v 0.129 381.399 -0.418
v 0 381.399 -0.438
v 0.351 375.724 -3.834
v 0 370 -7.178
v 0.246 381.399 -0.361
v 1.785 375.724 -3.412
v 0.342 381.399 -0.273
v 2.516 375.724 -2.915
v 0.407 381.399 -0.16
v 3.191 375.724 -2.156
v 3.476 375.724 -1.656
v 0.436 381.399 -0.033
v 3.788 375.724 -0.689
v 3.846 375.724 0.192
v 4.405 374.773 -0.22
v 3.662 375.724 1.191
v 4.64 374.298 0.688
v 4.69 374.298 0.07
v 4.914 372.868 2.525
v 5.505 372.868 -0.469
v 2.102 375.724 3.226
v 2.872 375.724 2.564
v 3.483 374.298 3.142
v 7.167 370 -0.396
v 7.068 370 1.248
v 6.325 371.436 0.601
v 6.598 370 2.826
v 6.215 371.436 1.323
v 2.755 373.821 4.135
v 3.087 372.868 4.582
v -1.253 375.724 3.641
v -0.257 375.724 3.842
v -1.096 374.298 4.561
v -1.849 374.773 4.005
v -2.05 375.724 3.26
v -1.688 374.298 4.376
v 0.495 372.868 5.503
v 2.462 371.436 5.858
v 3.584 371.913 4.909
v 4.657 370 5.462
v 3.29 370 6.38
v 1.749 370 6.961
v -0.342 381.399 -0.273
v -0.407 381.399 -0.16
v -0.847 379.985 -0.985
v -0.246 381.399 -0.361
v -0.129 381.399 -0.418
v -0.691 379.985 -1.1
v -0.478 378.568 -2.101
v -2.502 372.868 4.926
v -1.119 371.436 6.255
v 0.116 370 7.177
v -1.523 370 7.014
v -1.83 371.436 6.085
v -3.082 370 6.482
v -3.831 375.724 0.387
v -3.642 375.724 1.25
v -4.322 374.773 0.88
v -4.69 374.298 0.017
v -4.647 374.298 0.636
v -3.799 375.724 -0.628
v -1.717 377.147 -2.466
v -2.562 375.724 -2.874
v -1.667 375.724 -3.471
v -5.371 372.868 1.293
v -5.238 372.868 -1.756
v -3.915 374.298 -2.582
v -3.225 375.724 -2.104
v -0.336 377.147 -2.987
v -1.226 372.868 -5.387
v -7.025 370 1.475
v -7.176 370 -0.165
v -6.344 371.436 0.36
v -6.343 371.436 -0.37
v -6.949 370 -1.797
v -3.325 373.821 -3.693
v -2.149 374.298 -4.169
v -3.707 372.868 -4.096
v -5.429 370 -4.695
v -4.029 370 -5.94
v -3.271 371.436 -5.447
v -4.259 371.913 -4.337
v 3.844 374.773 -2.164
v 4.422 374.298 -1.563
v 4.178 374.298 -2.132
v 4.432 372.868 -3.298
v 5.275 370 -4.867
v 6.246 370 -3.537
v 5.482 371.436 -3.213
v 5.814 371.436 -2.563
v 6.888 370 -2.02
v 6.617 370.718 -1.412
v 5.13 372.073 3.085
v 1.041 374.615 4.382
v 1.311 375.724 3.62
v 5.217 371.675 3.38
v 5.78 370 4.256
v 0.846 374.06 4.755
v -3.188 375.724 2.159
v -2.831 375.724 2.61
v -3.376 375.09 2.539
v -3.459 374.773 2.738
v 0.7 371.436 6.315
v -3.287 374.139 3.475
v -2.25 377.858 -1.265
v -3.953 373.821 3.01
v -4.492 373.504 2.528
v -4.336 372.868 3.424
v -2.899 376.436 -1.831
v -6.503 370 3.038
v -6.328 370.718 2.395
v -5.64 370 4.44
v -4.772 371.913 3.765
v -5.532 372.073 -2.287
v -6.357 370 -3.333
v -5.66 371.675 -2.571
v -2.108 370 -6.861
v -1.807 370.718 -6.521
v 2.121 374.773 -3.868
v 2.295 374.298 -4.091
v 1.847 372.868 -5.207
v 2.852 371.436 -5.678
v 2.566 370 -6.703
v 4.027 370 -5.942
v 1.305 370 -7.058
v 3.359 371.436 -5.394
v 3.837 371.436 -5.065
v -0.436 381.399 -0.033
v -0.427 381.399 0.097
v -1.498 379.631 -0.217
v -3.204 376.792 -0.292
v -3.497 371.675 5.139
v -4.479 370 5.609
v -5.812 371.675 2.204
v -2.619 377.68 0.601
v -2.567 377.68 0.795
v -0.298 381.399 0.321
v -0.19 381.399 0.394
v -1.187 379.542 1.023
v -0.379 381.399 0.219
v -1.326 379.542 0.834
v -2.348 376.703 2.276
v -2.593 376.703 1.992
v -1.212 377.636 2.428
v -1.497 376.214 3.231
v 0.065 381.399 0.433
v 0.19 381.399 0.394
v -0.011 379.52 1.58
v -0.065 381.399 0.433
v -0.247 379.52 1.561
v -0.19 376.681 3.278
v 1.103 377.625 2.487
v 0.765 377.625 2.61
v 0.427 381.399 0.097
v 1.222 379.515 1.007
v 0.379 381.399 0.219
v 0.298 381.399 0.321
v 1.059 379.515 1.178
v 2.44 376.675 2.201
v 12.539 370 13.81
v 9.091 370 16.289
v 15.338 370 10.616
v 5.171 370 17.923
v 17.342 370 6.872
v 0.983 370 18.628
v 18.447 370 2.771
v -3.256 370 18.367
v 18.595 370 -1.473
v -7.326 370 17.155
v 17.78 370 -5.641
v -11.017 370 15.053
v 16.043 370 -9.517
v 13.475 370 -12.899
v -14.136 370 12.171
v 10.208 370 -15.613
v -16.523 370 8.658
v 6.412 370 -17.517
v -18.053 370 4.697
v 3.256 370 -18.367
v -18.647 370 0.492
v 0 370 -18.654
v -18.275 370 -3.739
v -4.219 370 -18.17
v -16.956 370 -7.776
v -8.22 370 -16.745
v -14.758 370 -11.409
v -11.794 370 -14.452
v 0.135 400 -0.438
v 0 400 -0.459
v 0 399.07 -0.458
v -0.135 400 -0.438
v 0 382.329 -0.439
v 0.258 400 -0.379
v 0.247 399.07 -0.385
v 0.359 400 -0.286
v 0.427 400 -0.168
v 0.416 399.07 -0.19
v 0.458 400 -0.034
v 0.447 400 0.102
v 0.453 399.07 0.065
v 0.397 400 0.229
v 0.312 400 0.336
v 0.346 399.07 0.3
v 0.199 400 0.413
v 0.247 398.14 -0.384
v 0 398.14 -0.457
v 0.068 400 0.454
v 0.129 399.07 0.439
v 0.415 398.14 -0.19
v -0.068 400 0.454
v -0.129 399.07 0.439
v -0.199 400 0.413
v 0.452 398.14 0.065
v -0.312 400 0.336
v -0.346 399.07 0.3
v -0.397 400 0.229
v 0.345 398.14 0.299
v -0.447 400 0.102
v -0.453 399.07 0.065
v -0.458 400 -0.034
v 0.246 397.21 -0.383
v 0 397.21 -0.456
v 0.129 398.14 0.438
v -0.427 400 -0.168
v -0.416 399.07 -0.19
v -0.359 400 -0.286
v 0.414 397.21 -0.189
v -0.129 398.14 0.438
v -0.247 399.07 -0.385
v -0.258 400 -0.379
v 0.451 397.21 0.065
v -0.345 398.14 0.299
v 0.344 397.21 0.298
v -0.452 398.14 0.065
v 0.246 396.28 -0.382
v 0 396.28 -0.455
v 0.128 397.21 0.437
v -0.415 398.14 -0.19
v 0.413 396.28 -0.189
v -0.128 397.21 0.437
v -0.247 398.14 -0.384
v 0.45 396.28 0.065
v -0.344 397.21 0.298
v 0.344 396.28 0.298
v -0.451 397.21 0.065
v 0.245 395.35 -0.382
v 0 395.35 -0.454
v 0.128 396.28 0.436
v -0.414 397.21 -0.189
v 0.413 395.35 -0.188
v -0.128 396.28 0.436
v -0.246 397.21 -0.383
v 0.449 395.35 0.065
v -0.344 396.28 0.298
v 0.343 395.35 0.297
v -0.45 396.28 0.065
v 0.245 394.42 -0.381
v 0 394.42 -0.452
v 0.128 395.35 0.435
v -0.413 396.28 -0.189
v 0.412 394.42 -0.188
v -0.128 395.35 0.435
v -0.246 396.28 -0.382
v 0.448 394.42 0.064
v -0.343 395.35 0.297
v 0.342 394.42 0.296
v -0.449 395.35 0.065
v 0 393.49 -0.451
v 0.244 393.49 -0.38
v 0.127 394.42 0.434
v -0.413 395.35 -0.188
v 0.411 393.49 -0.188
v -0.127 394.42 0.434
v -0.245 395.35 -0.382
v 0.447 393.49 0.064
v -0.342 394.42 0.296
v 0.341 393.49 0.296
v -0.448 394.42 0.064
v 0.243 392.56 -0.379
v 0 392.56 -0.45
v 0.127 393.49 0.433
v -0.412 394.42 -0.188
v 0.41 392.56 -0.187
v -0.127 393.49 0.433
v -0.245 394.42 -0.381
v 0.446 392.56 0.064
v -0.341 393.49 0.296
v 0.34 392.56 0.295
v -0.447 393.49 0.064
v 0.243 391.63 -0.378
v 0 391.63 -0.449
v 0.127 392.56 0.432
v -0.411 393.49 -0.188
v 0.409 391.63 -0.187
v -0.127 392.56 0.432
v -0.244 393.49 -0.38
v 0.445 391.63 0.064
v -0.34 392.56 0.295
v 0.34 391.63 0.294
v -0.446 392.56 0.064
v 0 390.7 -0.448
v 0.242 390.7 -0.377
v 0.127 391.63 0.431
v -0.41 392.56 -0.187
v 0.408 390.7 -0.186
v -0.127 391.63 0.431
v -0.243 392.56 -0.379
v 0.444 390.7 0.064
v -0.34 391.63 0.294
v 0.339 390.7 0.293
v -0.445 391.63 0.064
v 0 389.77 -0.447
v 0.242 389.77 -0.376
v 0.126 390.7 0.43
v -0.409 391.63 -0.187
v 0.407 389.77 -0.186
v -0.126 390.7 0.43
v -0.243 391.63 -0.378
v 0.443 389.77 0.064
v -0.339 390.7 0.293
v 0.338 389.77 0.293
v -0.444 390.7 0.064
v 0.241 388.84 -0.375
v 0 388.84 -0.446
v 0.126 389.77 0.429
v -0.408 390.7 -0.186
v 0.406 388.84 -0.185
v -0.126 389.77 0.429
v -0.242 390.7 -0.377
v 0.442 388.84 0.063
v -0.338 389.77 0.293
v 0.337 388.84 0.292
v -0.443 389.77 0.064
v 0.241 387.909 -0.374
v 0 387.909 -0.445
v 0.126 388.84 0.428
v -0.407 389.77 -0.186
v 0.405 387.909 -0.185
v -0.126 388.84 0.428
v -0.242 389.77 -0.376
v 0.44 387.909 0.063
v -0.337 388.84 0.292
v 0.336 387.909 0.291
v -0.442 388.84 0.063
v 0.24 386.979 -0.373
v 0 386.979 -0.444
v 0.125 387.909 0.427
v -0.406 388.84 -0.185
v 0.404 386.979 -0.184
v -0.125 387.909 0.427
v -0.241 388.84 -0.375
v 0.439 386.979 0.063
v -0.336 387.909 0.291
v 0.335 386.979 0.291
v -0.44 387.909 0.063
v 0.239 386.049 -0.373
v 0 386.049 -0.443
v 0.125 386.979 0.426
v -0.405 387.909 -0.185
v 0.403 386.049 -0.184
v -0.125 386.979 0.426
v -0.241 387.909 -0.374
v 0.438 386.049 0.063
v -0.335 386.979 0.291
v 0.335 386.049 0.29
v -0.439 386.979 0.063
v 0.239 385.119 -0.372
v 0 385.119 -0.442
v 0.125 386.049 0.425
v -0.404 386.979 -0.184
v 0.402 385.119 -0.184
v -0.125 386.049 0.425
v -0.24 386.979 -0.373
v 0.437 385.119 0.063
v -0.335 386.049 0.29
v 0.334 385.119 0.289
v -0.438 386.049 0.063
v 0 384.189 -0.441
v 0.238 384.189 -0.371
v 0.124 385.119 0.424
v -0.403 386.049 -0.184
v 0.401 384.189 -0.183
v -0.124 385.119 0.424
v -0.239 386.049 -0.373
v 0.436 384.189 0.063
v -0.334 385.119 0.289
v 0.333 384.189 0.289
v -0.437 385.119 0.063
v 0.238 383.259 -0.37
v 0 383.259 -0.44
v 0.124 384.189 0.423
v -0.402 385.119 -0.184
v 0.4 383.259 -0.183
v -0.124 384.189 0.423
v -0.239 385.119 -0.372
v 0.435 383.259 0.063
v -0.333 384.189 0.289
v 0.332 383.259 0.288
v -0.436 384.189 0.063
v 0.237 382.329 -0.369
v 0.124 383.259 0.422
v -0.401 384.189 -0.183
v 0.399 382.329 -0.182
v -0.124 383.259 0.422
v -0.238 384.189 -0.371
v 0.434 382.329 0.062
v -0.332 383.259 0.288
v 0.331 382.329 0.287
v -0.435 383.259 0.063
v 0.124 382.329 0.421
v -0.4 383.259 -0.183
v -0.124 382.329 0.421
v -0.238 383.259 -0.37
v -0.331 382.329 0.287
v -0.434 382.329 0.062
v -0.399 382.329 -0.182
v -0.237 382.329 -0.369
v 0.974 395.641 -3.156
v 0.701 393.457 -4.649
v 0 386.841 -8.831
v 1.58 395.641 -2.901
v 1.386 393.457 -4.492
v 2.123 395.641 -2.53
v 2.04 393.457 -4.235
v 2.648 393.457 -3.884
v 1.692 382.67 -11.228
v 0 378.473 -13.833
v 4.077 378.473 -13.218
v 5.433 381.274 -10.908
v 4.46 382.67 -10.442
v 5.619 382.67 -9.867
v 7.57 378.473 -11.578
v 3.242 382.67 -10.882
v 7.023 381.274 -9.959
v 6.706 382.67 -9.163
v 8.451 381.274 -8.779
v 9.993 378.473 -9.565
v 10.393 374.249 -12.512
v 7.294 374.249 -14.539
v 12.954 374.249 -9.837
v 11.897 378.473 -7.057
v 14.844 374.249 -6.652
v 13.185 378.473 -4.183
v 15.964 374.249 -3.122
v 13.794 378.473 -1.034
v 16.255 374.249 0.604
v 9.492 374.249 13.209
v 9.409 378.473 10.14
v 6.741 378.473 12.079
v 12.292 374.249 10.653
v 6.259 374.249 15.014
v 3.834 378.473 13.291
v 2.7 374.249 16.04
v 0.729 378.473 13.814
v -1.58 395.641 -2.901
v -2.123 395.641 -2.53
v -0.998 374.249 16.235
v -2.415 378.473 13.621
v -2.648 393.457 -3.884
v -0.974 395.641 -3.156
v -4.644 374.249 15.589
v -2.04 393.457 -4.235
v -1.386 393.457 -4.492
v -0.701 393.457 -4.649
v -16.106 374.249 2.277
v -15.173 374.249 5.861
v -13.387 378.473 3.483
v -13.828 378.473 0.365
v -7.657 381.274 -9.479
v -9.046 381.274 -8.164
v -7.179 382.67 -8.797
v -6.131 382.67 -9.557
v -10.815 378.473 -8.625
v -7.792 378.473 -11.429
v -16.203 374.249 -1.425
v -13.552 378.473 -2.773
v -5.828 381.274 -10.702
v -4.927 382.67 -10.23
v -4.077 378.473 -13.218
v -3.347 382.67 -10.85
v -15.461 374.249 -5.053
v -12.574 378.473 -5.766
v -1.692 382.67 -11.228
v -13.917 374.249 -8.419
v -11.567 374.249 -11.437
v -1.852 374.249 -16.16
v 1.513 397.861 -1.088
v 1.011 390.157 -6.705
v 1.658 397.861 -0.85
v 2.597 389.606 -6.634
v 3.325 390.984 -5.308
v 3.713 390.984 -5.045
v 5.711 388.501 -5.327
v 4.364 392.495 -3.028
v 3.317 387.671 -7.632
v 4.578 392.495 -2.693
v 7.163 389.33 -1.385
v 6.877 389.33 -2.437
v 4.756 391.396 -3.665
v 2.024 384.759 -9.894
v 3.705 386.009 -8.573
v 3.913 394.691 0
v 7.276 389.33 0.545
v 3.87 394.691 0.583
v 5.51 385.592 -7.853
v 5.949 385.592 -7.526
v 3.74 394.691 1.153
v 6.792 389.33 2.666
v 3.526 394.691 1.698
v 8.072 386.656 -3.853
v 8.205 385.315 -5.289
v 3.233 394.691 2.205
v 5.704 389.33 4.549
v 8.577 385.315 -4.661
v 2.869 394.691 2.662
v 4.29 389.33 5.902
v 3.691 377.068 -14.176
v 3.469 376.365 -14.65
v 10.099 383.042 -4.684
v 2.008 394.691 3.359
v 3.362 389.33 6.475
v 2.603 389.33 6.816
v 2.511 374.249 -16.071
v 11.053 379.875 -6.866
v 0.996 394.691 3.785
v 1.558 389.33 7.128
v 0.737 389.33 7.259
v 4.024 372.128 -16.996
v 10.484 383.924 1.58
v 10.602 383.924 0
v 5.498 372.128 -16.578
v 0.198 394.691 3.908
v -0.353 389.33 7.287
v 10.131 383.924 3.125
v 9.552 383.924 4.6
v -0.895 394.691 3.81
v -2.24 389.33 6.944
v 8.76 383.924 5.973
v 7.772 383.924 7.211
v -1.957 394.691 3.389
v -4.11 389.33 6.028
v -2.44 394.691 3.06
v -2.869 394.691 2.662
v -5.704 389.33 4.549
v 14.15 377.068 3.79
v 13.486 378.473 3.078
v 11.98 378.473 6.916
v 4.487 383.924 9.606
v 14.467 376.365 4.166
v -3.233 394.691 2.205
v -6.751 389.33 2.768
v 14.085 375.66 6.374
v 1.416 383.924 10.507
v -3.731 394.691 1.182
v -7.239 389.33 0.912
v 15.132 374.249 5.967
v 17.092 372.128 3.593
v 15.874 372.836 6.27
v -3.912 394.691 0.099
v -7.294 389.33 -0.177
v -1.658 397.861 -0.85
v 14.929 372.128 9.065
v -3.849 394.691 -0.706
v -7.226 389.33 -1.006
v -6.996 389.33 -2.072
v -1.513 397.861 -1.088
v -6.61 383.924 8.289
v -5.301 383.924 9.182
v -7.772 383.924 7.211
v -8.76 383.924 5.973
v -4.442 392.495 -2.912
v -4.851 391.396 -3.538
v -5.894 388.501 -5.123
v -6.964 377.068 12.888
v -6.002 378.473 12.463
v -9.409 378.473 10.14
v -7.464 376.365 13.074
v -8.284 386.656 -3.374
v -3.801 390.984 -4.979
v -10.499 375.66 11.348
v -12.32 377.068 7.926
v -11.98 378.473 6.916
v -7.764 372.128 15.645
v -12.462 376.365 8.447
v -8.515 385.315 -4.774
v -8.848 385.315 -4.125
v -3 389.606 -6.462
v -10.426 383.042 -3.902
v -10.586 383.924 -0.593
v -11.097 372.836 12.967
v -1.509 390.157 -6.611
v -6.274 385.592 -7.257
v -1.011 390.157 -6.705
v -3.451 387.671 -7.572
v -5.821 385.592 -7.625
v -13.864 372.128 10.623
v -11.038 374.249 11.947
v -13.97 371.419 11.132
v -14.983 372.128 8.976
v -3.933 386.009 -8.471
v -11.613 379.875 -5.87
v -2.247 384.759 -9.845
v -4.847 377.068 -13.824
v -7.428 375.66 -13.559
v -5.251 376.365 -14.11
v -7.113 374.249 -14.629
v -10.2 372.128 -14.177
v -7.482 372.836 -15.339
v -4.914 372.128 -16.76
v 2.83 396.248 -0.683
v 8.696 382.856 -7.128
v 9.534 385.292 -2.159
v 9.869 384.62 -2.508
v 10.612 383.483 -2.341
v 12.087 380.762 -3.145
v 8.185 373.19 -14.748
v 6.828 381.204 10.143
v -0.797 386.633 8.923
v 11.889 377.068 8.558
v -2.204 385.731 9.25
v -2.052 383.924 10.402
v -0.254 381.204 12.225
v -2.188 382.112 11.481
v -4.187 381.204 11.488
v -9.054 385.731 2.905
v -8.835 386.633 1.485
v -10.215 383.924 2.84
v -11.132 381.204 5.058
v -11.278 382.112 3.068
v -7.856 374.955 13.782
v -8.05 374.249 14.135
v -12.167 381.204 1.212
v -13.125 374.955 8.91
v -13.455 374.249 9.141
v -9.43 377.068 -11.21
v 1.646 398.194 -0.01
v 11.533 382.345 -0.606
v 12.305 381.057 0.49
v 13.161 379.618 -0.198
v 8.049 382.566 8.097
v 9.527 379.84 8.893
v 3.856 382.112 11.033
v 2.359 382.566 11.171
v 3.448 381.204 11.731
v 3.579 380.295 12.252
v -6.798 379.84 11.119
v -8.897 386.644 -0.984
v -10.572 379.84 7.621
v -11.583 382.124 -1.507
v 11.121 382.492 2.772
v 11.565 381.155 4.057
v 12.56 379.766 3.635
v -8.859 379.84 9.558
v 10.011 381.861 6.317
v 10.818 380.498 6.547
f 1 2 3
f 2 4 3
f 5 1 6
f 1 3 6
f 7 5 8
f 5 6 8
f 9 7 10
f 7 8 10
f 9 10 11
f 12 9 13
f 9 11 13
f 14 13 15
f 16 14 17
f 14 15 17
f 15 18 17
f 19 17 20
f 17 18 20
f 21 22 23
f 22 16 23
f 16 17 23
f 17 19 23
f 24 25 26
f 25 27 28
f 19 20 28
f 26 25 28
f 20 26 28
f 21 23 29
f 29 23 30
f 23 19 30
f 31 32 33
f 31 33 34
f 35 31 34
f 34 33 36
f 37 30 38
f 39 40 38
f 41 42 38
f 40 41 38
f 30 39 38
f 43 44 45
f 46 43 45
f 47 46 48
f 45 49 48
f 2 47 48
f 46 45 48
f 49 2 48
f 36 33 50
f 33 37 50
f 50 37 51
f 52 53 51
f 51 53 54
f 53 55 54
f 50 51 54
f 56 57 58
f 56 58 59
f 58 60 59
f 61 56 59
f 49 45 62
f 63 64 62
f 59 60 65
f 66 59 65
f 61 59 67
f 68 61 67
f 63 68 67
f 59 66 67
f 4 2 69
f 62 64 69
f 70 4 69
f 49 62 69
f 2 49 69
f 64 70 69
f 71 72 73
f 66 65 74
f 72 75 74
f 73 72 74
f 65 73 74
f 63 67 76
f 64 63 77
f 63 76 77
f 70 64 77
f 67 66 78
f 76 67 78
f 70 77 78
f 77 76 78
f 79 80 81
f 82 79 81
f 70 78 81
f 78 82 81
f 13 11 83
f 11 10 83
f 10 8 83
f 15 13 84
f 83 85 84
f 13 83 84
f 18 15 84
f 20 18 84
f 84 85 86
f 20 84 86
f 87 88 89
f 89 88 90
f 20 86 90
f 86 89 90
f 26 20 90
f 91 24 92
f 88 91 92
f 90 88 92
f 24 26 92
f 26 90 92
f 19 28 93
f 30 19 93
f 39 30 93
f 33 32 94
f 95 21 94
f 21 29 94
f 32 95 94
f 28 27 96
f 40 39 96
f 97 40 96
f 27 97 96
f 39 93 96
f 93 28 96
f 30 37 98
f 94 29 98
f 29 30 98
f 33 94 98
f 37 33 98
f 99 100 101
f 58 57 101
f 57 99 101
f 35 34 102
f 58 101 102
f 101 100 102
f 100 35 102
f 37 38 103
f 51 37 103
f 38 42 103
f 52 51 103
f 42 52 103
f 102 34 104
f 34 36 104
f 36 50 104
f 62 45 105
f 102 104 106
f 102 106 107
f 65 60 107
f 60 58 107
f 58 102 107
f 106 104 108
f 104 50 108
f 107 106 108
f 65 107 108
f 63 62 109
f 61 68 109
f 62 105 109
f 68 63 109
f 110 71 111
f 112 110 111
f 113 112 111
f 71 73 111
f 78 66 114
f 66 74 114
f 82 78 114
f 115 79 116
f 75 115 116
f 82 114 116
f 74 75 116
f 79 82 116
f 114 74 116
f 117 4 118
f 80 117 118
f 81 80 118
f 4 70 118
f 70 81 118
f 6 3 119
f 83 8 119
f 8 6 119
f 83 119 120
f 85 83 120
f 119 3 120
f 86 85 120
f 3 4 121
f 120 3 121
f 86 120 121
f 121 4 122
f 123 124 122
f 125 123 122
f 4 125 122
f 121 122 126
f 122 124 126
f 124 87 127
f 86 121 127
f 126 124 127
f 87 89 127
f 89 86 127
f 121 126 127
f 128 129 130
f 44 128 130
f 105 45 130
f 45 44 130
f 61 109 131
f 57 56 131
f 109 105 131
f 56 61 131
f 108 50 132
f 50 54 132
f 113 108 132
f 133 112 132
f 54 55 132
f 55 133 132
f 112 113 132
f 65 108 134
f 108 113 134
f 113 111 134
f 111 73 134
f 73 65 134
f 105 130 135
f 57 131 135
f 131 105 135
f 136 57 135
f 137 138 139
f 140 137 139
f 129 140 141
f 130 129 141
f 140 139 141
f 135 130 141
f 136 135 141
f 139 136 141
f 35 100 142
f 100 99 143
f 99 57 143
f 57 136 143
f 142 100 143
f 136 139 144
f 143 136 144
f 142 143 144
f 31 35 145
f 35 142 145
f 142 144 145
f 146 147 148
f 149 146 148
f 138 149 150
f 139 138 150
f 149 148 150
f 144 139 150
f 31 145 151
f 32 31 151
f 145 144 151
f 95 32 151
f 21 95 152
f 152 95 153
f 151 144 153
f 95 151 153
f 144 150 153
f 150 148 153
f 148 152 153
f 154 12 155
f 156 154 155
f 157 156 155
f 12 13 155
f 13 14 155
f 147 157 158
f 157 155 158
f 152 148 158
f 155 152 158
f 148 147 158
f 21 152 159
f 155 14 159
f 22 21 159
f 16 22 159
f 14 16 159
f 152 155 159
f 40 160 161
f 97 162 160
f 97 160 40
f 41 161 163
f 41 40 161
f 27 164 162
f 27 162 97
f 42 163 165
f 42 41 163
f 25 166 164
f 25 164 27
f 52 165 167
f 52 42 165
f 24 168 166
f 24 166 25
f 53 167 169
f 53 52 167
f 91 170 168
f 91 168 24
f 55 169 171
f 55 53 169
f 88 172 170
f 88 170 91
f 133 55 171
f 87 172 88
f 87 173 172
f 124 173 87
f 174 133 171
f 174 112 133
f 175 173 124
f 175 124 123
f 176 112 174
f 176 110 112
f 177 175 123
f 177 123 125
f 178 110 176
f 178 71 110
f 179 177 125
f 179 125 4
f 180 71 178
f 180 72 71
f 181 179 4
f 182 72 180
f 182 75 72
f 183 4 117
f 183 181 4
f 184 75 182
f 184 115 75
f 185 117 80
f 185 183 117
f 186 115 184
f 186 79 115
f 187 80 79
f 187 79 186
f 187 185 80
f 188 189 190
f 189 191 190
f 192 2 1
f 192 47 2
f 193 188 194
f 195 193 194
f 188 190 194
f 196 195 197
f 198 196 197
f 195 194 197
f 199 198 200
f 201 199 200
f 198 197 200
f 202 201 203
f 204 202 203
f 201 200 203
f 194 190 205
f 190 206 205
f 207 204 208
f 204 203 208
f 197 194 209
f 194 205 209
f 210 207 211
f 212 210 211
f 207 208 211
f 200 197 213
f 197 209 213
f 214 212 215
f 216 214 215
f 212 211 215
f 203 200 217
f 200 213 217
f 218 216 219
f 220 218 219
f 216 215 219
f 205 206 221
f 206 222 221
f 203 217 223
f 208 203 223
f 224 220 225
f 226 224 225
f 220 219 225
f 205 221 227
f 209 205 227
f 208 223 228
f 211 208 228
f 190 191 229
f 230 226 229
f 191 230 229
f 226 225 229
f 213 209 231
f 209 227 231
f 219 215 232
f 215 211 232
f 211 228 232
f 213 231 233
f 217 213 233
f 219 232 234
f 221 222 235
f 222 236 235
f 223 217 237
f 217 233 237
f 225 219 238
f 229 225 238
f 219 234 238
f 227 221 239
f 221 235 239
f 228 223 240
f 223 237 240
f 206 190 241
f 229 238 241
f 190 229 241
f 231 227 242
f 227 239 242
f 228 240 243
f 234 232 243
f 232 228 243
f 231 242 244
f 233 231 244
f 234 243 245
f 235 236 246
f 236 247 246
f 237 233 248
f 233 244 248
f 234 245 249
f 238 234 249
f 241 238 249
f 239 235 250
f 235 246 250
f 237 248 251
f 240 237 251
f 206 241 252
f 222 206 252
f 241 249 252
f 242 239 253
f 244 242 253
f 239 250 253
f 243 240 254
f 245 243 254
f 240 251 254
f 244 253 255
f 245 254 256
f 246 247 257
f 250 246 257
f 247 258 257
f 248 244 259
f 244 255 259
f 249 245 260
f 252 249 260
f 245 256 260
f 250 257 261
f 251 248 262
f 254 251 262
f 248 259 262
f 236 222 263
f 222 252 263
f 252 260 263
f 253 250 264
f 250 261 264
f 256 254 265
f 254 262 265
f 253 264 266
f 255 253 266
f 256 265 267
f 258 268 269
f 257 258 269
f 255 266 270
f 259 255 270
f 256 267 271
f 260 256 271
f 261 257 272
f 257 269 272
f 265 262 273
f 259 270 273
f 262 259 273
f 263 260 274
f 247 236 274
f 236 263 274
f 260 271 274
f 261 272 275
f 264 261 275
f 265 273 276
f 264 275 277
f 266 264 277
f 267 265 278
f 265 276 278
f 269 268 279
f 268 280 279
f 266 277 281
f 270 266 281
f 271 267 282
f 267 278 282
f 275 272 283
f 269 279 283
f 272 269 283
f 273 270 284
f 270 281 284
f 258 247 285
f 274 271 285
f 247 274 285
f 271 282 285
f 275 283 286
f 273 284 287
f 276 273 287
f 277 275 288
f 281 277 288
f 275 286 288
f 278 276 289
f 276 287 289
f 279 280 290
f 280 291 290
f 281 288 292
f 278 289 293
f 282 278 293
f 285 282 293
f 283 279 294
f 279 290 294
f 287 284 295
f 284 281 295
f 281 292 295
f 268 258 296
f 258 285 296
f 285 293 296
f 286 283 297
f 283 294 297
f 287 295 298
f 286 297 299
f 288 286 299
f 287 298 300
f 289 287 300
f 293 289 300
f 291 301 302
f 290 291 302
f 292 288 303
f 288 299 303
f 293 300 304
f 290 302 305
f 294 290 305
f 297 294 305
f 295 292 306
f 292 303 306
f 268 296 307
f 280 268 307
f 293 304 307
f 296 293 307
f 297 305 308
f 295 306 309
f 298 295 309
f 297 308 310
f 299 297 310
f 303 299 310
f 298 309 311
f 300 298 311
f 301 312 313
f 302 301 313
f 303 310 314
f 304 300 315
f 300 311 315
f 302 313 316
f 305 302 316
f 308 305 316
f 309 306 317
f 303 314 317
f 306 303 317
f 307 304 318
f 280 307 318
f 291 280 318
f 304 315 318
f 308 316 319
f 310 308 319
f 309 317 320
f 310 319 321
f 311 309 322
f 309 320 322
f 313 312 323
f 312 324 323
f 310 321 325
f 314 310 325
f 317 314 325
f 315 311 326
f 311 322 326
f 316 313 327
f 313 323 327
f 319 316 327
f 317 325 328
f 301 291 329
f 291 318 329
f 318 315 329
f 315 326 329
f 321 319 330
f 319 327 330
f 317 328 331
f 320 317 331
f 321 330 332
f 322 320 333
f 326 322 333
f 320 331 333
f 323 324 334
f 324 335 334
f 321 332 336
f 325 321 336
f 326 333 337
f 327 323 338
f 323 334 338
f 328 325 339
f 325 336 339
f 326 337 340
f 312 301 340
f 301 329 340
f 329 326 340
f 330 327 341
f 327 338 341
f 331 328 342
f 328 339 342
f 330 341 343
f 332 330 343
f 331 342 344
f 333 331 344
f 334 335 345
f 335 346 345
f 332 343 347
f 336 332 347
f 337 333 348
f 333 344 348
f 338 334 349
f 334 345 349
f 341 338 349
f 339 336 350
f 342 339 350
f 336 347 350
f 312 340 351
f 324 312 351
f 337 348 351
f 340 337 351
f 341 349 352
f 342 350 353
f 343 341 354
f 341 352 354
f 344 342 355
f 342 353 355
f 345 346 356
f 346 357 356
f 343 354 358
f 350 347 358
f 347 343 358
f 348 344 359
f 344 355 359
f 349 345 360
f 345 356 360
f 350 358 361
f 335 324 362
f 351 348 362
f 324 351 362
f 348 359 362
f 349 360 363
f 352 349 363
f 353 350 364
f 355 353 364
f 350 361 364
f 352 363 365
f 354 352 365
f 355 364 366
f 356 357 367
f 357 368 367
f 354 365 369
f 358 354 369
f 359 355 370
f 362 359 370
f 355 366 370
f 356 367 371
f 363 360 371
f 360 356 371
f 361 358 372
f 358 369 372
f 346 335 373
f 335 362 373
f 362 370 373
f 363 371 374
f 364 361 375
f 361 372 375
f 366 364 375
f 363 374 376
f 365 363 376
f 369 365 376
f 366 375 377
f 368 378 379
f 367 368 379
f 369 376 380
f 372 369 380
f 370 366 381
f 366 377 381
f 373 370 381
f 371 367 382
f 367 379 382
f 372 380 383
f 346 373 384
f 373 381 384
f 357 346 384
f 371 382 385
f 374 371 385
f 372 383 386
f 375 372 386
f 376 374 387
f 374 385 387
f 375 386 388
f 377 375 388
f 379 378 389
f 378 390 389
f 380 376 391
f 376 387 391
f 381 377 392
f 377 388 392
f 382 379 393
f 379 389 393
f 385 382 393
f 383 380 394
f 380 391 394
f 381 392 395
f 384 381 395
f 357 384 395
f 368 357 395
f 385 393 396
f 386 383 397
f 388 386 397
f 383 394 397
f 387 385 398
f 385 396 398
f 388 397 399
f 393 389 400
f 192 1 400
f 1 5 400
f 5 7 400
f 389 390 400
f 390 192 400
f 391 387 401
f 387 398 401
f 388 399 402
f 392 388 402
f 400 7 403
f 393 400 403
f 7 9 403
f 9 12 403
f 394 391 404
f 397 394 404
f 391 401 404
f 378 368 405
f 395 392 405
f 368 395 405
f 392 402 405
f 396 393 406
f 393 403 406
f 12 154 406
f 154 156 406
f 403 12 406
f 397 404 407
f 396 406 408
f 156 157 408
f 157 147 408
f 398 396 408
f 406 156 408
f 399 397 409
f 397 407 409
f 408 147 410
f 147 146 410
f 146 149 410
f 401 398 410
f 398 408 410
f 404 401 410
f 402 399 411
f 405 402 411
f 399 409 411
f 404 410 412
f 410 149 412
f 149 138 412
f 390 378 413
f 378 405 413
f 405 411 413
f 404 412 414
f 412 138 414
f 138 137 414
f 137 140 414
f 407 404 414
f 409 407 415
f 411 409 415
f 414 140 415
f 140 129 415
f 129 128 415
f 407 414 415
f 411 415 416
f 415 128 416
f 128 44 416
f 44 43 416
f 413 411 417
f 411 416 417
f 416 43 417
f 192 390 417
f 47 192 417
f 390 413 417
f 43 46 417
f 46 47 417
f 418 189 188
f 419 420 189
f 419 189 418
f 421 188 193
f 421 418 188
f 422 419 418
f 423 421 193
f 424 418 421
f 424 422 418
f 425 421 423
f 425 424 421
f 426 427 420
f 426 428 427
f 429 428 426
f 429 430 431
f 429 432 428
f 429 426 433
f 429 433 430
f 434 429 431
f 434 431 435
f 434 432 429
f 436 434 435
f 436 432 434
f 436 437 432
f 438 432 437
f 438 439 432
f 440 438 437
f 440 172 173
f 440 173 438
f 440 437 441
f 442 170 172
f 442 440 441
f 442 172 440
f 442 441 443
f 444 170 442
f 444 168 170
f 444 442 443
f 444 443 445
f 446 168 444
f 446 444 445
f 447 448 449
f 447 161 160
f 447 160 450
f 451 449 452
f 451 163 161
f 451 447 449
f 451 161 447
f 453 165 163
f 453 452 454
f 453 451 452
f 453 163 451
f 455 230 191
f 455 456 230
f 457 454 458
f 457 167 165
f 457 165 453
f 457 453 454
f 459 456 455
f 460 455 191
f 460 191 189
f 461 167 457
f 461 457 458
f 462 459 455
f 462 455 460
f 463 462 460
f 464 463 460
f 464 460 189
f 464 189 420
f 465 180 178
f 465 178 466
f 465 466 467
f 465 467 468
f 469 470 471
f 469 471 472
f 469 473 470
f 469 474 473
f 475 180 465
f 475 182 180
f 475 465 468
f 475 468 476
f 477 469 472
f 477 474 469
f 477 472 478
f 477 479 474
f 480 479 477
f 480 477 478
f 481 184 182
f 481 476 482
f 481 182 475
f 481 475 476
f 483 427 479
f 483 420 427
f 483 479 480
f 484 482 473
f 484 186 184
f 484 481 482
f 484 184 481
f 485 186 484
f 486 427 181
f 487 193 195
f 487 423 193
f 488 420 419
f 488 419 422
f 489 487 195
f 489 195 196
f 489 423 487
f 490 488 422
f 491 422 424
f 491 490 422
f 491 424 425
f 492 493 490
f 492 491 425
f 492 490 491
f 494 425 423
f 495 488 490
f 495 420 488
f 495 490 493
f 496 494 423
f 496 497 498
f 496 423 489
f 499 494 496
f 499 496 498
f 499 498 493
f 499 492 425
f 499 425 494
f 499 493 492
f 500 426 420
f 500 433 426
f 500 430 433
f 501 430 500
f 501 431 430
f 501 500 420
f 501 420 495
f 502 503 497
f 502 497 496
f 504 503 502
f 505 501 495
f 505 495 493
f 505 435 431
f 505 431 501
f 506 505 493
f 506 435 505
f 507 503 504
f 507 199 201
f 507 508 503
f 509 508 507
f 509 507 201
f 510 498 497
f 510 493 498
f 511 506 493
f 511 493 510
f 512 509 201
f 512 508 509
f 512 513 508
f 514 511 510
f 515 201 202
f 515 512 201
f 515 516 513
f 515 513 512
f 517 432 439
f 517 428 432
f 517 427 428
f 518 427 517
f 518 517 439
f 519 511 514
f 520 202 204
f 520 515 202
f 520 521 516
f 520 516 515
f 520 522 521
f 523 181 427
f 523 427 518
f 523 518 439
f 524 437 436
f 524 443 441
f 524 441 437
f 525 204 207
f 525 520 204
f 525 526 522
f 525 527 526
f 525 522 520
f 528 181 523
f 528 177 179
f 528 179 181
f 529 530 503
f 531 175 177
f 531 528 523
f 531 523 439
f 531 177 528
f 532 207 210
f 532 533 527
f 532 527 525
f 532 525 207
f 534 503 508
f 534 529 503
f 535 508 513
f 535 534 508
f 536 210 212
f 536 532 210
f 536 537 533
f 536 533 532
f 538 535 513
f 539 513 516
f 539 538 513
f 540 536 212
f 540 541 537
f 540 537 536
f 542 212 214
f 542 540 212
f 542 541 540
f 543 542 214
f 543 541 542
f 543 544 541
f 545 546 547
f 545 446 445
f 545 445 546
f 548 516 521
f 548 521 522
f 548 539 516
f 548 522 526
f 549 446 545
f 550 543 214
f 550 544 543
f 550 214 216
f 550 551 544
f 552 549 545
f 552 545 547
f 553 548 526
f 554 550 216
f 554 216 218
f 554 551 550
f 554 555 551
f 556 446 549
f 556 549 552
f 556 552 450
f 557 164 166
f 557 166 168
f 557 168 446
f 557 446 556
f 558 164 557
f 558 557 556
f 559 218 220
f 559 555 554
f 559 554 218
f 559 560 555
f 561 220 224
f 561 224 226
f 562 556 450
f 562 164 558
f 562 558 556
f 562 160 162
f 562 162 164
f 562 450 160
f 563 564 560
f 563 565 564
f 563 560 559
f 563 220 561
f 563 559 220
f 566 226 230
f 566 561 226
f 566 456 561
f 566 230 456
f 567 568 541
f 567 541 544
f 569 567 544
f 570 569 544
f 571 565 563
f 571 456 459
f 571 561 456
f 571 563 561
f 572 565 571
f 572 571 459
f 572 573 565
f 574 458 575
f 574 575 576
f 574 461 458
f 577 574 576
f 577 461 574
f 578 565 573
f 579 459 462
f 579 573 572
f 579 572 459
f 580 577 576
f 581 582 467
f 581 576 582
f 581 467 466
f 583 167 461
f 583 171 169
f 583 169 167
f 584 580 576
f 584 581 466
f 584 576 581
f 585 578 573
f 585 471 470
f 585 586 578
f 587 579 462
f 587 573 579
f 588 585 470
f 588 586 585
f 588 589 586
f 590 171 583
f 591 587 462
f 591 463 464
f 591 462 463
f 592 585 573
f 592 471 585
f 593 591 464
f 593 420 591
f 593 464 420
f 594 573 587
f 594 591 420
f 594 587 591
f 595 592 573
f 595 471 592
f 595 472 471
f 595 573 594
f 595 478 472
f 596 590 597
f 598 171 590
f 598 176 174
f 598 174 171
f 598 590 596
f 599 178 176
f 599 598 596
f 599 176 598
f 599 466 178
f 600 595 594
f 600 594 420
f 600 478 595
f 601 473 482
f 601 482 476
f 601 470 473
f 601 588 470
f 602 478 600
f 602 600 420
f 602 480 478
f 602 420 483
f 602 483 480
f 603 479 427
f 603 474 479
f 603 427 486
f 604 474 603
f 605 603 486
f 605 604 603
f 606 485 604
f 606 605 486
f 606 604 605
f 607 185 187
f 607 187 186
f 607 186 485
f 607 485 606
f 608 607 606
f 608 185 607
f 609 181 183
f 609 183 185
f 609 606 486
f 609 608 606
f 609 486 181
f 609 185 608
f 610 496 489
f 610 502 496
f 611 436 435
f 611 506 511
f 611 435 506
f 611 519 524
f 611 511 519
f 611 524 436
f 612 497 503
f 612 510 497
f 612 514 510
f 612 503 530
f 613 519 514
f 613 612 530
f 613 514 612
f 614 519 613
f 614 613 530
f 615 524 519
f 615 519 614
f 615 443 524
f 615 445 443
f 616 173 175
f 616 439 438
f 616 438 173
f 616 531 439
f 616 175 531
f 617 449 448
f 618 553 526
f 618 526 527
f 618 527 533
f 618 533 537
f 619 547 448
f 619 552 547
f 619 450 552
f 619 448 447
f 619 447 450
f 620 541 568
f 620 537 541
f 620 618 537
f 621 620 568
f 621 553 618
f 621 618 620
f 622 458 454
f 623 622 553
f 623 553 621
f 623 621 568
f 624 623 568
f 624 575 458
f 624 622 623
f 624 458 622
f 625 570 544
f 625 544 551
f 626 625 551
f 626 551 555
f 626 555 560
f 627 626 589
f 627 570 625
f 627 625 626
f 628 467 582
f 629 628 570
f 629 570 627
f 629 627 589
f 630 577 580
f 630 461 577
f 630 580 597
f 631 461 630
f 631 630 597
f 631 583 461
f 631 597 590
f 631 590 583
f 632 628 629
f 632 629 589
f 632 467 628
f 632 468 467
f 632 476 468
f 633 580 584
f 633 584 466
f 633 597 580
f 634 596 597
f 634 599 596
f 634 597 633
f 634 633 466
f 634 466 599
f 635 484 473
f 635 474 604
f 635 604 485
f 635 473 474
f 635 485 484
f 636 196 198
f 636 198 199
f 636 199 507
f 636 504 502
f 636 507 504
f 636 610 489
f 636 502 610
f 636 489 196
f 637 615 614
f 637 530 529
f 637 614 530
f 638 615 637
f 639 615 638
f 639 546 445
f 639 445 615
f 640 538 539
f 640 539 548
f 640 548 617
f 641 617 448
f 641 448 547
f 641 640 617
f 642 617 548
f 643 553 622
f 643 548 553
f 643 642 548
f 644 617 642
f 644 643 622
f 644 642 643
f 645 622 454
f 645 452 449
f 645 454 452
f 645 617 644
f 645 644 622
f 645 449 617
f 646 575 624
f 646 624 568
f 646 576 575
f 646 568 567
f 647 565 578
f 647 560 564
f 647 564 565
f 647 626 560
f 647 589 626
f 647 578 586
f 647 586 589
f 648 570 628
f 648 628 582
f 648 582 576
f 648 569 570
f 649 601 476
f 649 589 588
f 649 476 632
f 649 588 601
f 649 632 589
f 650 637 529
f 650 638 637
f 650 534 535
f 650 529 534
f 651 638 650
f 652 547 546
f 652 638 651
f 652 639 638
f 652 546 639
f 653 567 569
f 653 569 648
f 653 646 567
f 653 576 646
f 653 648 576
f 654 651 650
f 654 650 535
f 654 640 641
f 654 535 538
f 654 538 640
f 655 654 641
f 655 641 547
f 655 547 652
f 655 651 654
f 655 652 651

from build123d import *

# Parameters (mm, degrees)
BOSS_EXTRUDE1_START = -300
SKETCH2_R           = 65.685518314
SKETCH2_R_2         = 57.685518314
BOSS_EXTRUDE1_DEPTH = 300
SKETCH3_R           = 120.726600854
CUT_EXTRUDE1_DEPTH  = 532.239063666


with BuildPart() as part:
    # Sketch1 → Revolve3 (revolve)
    with BuildSketch(Plane.XY, mode=Mode.PRIVATE) as revolve3_sk:
        with BuildLine():
            Line((75.685518314, -0.344450695), (75.685518314, 149.655549305))
            add(Edge.make_bspline(
                [(0.458845088, 400), (0.666505615, 399.685666805), (1.083577622, 399.052178662), (1.970059475, 397.700550841), (2.936759655, 396.211212549), (3.902634821, 394.710095548), (4.880100736, 393.178406868), (5.844047989, 391.654155139), (6.803360265, 390.123894266), (7.761821662, 388.581395307), (8.719237727, 387.026713906), (16.64656029, 374.037008419), (28.257300922, 353.014913091), (42.102023433, 323.258697722), (56.610767976, 282.331206247), (67.05955857, 242.08025425), (72.334052865, 209.220016816), (74.5835291, 183.923611768), (75.273053413, 169.173424136), (75.397271583, 165.955632222), (75.484778379, 163.208321649), (75.535317822, 161.393000412), (75.578401528, 159.587415566), (75.614305657, 157.784317211), (75.643029642, 155.967426667), (75.664573028, 154.18293971), (75.678935474, 152.40648291), (75.684321434, 150.790982345), (75.685518314, 150.032282914), (75.685518314, 149.655549305)],
                knots=[0.082616428, 0.082616428, 0.082616428, 0.082616428, 0.082616428, 0.088299706, 0.093982984, 0.099666263, 0.105349541, 0.111032819, 0.116716097, 0.122399375, 0.128082653, 0.133891142, 0.139699631, 0.313954311, 0.430124092, 0.546293874, 0.685697612, 0.836718331, 0.848335309, 0.865760775, 0.871569264, 0.877252541, 0.882935819, 0.888619096, 0.894302373, 0.899985651, 0.905668928, 0.911352205, 0.917035483, 0.917035483, 0.917035483, 0.917035483, 0.917035483], degree=4))
            Line((0.458845088, 400), (0.43750857, 381.399188372))
            add(Edge.make_bspline(
                [(0.43750857, 381.399188372), (0.55852927, 381.201299105), (3.495430864, 376.390848647), (11.792504456, 362.199887034), (29.079217345, 328.534275172), (48.408588041, 277.933780444), (60.172497106, 225.059949932), (64.30600489, 187.441870002), (65.266674131, 169.911010475), (65.525365527, 161.807957388), (65.602345571, 158.438692592), (65.640090713, 156.064661932), (65.657046141, 154.723430387), (65.667429233, 153.726401125), (65.675476765, 152.707134592), (65.68126504, 151.595575293), (65.684757556, 150.498770837), (65.685518314, 149.951992083), (65.685518314, 149.655549305)],
                knots=[0.132529105, 0.132529105, 0.132529105, 0.132529105, 0.134767619, 0.18691881, 0.291221192, 0.499825955, 0.708430719, 0.812733101, 0.864884292, 0.877922089, 0.890959887, 0.897478786, 0.900738235, 0.903997685, 0.907257134, 0.910516584, 0.913776033, 0.917035483, 0.917035483, 0.917035483, 0.917035483], degree=3))
            Line((65.685518314, 149.655549305), (65.685518314, -0.344450695))
            Line((65.685518314, -0.344450695), (75.685518314, -0.344450695))
        make_face()
    revolve(revolve3_sk.sketch.rotate(Axis((0, -198.817850362, 0), (0, -1, 0)), 270), axis=Axis((0, -198.817850362, 0), (0, -1, 0)))

    # Sketch2 → Boss-Extrude1 (add)
    with BuildSketch(Plane(origin=(0, 149.655549305, 0), x_dir=(1, 0, 0), z_dir=(0, 1, 0)).offset(BOSS_EXTRUDE1_START)):
        with Locations(Location((0, 0, 0), (0, 0, 270))):
            Circle(SKETCH2_R)
        with Locations(Location((0, 0, 0), (0, 0, 270))):
            Circle(SKETCH2_R_2, mode=Mode.SUBTRACT)
    extrude(amount=BOSS_EXTRUDE1_DEPTH)

    # Sketch3 → Cut-Extrude1 (cut, through all)
    with BuildSketch(Plane(origin=(0, 370, 0), x_dir=(-1, 0, 0), z_dir=(0, -1, 0))):
        Circle(SKETCH3_R)
    extrude(amount=CUT_EXTRUDE1_DEPTH, mode=Mode.SUBTRACT)


solid = part.part
